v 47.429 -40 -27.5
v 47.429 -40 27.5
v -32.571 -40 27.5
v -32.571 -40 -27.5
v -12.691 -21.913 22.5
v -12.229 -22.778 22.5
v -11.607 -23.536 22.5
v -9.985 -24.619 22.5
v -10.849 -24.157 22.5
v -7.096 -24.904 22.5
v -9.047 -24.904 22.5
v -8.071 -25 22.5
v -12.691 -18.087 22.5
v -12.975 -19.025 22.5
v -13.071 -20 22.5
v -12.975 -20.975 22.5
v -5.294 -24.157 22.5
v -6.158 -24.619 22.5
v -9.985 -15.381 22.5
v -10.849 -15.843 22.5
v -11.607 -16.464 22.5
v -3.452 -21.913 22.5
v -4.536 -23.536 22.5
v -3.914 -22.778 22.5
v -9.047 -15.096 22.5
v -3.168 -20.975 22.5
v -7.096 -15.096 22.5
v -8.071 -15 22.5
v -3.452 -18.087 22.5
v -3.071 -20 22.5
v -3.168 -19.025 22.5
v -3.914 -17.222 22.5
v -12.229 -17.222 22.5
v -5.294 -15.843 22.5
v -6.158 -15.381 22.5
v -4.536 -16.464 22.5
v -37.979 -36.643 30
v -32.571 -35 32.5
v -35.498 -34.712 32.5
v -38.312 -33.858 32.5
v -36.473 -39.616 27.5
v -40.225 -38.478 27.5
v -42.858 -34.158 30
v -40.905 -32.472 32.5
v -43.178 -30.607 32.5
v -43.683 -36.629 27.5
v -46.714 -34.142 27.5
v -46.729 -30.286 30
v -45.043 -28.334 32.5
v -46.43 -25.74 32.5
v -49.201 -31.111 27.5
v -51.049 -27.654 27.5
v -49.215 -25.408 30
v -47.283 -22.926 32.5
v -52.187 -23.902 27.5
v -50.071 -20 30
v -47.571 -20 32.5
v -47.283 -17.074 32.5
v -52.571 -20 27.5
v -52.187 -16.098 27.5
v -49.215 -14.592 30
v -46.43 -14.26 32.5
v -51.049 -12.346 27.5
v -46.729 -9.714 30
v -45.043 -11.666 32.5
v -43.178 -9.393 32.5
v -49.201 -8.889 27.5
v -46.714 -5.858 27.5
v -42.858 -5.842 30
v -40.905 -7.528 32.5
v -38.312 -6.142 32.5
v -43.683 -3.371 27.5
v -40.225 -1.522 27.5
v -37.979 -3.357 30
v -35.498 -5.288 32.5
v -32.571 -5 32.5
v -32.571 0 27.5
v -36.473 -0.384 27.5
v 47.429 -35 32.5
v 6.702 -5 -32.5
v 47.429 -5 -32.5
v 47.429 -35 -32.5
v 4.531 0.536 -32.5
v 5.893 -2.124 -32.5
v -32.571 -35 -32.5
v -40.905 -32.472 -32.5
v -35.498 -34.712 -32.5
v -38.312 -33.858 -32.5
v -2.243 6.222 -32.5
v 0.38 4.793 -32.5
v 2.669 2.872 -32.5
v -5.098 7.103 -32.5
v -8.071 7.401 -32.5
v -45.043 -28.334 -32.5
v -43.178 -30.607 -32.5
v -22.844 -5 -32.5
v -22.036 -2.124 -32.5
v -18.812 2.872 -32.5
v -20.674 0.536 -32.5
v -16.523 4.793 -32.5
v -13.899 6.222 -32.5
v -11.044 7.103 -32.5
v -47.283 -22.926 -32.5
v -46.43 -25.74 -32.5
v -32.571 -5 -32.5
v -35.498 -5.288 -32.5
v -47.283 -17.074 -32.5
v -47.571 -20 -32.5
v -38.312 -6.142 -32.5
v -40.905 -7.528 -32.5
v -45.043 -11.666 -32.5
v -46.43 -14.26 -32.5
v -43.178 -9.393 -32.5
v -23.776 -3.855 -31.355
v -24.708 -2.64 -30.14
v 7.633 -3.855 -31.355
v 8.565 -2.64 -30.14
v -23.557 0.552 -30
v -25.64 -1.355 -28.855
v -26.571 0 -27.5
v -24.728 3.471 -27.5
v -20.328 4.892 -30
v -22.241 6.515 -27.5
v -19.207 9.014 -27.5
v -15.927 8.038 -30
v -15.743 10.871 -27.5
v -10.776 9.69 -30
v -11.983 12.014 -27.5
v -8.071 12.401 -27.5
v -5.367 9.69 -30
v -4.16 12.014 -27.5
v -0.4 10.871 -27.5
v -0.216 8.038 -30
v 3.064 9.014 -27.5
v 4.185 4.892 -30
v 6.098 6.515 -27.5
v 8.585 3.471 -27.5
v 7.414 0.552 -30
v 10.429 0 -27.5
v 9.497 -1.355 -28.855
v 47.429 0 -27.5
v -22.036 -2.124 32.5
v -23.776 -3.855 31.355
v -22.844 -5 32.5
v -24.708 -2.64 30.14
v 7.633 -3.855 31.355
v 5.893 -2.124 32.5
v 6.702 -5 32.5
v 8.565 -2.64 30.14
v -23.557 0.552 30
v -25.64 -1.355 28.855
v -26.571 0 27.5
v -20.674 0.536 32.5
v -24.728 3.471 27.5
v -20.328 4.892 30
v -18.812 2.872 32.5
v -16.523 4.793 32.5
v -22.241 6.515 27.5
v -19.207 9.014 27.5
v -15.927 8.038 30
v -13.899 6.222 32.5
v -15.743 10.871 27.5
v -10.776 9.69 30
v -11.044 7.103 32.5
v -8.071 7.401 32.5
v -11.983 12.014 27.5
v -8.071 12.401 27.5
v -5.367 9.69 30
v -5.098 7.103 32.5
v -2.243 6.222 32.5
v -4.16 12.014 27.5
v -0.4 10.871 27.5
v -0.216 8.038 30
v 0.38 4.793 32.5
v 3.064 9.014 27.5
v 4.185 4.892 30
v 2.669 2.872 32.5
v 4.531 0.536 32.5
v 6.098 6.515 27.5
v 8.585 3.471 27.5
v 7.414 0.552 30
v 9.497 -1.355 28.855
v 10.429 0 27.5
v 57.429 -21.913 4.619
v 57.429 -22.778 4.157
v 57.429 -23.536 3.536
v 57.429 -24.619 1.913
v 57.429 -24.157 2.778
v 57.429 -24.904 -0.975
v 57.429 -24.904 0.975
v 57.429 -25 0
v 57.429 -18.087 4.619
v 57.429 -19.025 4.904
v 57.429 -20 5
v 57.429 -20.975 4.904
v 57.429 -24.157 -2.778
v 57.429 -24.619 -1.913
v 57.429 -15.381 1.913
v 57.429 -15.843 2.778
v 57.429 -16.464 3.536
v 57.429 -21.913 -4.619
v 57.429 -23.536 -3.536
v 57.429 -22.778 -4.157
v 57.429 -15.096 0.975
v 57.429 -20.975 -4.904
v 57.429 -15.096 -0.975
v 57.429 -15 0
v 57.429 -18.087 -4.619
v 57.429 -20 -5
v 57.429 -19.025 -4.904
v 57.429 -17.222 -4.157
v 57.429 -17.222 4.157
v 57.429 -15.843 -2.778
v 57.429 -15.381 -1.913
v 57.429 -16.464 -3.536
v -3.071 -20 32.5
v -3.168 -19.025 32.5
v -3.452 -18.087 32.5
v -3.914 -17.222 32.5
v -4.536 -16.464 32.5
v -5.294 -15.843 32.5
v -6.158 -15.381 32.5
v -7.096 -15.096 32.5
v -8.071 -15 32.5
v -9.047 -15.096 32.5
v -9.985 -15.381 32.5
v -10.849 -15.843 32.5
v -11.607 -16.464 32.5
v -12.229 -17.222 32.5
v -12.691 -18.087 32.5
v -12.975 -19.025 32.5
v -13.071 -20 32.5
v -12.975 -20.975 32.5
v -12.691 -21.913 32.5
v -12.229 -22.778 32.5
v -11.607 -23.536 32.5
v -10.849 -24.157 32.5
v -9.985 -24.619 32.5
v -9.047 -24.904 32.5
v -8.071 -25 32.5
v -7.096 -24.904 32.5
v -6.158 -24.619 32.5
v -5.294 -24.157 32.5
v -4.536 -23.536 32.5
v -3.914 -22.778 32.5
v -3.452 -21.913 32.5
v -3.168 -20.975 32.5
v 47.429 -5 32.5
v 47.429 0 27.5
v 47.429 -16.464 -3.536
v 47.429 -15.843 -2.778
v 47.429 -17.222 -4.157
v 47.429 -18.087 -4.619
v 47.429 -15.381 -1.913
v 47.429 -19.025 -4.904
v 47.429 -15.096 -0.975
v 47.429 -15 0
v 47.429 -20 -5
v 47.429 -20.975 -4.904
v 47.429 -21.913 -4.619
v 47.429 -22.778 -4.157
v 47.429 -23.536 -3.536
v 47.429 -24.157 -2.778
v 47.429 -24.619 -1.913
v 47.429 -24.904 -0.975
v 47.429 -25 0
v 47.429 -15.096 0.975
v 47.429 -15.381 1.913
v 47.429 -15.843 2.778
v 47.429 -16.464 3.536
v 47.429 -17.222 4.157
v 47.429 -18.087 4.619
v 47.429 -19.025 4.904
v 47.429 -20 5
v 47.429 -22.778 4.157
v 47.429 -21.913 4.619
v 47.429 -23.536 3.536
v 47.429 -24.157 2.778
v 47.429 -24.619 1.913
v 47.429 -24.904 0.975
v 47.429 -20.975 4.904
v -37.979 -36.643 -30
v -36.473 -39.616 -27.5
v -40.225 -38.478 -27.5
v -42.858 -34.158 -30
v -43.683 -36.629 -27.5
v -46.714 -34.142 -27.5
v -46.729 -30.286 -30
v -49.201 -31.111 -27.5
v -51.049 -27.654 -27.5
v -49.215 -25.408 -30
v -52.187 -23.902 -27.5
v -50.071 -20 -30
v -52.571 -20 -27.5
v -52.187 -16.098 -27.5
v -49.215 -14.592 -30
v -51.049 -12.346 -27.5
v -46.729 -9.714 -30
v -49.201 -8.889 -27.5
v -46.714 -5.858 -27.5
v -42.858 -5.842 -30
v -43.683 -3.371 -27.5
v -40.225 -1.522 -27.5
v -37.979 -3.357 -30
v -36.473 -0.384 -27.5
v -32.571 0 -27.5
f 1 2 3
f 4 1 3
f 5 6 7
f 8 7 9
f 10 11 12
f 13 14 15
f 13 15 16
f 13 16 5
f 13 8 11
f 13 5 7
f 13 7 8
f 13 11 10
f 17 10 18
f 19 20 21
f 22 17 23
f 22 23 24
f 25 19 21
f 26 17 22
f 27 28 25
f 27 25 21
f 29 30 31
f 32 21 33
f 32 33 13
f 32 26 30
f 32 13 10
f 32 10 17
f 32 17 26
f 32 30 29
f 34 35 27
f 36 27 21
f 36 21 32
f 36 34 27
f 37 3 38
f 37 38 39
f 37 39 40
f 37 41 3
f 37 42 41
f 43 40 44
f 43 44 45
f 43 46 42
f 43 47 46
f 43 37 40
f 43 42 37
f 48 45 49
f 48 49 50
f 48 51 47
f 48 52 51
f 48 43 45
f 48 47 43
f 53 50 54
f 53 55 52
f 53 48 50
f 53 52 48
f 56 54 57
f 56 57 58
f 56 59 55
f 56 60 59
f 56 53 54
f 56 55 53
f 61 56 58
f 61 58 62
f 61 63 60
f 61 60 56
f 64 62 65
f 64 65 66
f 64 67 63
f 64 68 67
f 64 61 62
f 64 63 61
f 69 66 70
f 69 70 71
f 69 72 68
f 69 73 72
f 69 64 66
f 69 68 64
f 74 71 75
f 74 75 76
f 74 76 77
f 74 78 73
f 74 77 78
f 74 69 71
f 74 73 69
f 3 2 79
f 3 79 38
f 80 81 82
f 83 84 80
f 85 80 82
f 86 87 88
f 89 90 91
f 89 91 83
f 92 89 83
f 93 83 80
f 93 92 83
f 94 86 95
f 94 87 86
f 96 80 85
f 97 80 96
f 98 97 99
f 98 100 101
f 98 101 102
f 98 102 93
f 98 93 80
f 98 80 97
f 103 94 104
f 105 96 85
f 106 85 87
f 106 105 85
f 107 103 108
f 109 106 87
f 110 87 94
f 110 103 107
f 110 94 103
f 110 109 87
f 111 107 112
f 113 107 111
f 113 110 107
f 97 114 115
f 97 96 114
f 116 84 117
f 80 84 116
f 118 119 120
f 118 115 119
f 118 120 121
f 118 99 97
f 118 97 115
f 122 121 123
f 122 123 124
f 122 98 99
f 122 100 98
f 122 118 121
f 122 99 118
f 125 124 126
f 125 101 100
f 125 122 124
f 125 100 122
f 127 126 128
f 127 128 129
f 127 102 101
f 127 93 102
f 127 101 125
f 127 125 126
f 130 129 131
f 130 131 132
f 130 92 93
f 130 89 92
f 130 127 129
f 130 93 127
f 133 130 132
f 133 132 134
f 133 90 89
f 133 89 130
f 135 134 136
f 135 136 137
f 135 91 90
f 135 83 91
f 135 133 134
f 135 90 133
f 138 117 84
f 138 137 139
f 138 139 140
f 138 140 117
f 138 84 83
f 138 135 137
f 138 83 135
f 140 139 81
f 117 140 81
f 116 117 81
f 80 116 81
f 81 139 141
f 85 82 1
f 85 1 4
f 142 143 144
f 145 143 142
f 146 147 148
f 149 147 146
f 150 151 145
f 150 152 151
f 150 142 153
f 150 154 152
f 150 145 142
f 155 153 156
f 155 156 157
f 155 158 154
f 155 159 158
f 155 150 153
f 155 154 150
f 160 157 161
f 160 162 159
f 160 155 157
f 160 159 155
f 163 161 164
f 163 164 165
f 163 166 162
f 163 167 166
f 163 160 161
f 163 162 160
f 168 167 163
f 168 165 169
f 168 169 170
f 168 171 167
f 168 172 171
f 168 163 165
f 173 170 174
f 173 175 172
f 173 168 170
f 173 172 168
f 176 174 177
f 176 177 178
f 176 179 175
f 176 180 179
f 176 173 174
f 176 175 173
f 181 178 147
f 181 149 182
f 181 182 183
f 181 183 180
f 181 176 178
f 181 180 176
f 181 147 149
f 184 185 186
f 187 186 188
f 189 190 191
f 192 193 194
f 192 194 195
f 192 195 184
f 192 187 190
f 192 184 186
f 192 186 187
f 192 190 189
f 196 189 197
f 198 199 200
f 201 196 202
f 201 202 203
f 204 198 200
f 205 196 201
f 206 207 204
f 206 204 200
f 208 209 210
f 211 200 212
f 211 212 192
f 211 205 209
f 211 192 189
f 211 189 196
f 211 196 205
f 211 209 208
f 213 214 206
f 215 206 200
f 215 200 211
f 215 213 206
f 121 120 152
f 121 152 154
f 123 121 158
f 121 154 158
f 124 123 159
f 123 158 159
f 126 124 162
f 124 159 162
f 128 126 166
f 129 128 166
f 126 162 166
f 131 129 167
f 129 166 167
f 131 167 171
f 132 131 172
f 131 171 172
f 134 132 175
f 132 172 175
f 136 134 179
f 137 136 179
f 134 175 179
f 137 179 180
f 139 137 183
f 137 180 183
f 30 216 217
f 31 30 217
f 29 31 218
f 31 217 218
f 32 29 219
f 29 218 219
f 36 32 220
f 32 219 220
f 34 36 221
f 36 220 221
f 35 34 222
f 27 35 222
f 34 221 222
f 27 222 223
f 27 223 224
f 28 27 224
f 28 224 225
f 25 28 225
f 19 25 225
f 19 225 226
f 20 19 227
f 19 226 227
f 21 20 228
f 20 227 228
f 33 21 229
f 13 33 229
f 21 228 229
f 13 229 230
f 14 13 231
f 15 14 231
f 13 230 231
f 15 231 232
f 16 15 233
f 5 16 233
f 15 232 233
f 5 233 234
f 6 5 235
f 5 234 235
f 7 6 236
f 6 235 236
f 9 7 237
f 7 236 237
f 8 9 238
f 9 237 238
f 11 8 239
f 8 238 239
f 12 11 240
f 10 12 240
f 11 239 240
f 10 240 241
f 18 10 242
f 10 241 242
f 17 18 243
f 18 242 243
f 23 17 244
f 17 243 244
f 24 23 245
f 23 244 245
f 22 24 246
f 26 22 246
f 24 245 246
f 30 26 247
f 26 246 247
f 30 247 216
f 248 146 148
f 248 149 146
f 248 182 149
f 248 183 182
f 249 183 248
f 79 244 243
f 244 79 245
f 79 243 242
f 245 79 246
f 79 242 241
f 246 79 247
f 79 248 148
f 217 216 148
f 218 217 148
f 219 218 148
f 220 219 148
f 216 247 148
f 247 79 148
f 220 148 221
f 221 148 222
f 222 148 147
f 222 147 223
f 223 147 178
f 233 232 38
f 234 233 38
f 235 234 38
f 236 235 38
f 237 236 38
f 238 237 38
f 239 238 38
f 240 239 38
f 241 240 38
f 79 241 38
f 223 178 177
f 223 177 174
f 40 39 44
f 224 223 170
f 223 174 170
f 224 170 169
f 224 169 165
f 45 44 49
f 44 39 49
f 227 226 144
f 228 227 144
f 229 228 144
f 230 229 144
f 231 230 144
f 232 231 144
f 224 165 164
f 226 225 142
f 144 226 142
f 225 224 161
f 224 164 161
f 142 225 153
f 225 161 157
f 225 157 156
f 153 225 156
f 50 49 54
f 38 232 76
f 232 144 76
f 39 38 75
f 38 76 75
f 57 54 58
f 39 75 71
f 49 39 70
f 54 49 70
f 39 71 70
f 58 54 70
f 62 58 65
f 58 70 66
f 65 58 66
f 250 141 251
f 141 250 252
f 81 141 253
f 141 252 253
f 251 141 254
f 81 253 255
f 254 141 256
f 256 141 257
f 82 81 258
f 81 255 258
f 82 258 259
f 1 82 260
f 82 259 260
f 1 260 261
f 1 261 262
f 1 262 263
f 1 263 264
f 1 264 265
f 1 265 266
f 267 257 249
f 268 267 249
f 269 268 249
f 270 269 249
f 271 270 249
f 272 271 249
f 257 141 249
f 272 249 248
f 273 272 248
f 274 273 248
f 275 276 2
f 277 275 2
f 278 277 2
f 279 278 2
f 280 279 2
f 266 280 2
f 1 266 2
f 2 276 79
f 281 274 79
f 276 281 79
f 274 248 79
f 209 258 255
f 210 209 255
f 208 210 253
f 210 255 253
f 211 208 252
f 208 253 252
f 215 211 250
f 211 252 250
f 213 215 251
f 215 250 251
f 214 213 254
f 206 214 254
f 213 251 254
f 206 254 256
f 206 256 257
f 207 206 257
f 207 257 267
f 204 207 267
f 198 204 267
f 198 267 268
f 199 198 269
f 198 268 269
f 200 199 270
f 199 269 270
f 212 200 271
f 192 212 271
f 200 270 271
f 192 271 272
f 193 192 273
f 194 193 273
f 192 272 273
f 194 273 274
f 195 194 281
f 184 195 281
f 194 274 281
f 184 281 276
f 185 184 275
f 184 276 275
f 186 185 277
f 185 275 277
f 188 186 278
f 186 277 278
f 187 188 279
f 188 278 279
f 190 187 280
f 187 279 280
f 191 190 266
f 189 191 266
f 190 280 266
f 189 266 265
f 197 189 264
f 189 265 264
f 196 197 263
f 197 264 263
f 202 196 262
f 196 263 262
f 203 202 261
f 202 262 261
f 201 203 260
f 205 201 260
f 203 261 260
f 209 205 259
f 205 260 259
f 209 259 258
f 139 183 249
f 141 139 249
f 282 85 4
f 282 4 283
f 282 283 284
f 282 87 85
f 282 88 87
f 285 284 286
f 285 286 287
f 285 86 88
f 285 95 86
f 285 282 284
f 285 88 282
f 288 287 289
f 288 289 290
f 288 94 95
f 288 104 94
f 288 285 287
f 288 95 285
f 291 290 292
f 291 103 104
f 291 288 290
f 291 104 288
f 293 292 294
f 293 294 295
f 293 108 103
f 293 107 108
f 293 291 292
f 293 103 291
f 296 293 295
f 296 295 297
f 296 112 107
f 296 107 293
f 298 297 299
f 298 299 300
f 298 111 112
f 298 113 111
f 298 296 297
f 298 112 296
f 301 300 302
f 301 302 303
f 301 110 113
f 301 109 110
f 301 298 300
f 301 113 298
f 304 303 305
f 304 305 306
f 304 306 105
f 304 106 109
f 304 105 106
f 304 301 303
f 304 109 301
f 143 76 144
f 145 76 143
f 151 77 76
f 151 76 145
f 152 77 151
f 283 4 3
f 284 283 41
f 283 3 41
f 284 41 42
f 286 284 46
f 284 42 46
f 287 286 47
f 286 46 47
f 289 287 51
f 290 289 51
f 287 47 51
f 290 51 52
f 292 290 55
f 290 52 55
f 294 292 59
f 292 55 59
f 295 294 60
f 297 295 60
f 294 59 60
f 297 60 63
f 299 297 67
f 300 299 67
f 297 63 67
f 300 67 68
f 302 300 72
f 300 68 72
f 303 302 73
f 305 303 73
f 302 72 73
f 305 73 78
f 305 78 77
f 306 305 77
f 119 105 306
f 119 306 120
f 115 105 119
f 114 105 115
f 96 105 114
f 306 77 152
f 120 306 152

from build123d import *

# Parameters (mm, degrees)
BOSS_EXTRUDE1_DEPTH = 32.5
CHAMFER1_SIZE       = 5
SKETCH2_R           = 5
CUT_EXTRUDE1_DEPTH  = 10
SKETCH3_R           = 5
BOSS_EXTRUDE2_DEPTH = 10


with BuildPart() as part:
    # Sketch1 → Boss-Extrude1 (new body, symmetric)
    with BuildSketch(Plane.XY):
        with BuildLine():
            Line((47.428571429, 0), (47.428571429, -40))
            Line((47.428571429, -40), (-32.571428571, -40))
            ThreePointArc((-32.571428571, -40), (-52.571428571, -20), (-32.571428571, 0))
            Line((-32.571428571, 0), (-26.571428571, 0))
            ThreePointArc((-26.571428571, 0), (-8.071428571, 12.400657923), (10.428571429, 0))
            Line((10.428571429, 0), (47.428571429, 0))
        make_face()
    extrude(amount=BOSS_EXTRUDE1_DEPTH, both=True)

    # Chamfer1
    chamfer1_edges = [part.edges().sort_by_distance(p)[0] for p in [
        (28.928571429, 0, 32.5),
        (-8.071428571, 12.400657923, 32.5),
        (-29.571428571, 0, 32.5),
        (-52.571428571, -20, 32.5),
        (-29.571428571, 0, -32.5),
        (-8.071428571, 12.400657923, -32.5),
        (28.928571429, 0, -32.5),
        (7.428571429, -40, -32.5),
        (-52.571428571, -20, -32.5),
        (7.428571429, -40, 32.5),
    ]]
    chamfer(chamfer1_edges, length=CHAMFER1_SIZE)

    # Sketch2 → Cut-Extrude1 (cut)
    with BuildSketch(Plane.XY.offset(32.5)):
        with Locations((-8.071428571, -20)):
            Circle(SKETCH2_R)
    extrude(amount=-CUT_EXTRUDE1_DEPTH, mode=Mode.SUBTRACT)

    # Sketch3 → Boss-Extrude2 (add)
    with BuildSketch(Plane(origin=(47.428571429, 0, 0), x_dir=(0, 0, -1), z_dir=(1, 0, 0))):
        with Locations((0, -20)):
            Circle(SKETCH3_R)
    extrude(amount=BOSS_EXTRUDE2_DEPTH)


solid = part.part
